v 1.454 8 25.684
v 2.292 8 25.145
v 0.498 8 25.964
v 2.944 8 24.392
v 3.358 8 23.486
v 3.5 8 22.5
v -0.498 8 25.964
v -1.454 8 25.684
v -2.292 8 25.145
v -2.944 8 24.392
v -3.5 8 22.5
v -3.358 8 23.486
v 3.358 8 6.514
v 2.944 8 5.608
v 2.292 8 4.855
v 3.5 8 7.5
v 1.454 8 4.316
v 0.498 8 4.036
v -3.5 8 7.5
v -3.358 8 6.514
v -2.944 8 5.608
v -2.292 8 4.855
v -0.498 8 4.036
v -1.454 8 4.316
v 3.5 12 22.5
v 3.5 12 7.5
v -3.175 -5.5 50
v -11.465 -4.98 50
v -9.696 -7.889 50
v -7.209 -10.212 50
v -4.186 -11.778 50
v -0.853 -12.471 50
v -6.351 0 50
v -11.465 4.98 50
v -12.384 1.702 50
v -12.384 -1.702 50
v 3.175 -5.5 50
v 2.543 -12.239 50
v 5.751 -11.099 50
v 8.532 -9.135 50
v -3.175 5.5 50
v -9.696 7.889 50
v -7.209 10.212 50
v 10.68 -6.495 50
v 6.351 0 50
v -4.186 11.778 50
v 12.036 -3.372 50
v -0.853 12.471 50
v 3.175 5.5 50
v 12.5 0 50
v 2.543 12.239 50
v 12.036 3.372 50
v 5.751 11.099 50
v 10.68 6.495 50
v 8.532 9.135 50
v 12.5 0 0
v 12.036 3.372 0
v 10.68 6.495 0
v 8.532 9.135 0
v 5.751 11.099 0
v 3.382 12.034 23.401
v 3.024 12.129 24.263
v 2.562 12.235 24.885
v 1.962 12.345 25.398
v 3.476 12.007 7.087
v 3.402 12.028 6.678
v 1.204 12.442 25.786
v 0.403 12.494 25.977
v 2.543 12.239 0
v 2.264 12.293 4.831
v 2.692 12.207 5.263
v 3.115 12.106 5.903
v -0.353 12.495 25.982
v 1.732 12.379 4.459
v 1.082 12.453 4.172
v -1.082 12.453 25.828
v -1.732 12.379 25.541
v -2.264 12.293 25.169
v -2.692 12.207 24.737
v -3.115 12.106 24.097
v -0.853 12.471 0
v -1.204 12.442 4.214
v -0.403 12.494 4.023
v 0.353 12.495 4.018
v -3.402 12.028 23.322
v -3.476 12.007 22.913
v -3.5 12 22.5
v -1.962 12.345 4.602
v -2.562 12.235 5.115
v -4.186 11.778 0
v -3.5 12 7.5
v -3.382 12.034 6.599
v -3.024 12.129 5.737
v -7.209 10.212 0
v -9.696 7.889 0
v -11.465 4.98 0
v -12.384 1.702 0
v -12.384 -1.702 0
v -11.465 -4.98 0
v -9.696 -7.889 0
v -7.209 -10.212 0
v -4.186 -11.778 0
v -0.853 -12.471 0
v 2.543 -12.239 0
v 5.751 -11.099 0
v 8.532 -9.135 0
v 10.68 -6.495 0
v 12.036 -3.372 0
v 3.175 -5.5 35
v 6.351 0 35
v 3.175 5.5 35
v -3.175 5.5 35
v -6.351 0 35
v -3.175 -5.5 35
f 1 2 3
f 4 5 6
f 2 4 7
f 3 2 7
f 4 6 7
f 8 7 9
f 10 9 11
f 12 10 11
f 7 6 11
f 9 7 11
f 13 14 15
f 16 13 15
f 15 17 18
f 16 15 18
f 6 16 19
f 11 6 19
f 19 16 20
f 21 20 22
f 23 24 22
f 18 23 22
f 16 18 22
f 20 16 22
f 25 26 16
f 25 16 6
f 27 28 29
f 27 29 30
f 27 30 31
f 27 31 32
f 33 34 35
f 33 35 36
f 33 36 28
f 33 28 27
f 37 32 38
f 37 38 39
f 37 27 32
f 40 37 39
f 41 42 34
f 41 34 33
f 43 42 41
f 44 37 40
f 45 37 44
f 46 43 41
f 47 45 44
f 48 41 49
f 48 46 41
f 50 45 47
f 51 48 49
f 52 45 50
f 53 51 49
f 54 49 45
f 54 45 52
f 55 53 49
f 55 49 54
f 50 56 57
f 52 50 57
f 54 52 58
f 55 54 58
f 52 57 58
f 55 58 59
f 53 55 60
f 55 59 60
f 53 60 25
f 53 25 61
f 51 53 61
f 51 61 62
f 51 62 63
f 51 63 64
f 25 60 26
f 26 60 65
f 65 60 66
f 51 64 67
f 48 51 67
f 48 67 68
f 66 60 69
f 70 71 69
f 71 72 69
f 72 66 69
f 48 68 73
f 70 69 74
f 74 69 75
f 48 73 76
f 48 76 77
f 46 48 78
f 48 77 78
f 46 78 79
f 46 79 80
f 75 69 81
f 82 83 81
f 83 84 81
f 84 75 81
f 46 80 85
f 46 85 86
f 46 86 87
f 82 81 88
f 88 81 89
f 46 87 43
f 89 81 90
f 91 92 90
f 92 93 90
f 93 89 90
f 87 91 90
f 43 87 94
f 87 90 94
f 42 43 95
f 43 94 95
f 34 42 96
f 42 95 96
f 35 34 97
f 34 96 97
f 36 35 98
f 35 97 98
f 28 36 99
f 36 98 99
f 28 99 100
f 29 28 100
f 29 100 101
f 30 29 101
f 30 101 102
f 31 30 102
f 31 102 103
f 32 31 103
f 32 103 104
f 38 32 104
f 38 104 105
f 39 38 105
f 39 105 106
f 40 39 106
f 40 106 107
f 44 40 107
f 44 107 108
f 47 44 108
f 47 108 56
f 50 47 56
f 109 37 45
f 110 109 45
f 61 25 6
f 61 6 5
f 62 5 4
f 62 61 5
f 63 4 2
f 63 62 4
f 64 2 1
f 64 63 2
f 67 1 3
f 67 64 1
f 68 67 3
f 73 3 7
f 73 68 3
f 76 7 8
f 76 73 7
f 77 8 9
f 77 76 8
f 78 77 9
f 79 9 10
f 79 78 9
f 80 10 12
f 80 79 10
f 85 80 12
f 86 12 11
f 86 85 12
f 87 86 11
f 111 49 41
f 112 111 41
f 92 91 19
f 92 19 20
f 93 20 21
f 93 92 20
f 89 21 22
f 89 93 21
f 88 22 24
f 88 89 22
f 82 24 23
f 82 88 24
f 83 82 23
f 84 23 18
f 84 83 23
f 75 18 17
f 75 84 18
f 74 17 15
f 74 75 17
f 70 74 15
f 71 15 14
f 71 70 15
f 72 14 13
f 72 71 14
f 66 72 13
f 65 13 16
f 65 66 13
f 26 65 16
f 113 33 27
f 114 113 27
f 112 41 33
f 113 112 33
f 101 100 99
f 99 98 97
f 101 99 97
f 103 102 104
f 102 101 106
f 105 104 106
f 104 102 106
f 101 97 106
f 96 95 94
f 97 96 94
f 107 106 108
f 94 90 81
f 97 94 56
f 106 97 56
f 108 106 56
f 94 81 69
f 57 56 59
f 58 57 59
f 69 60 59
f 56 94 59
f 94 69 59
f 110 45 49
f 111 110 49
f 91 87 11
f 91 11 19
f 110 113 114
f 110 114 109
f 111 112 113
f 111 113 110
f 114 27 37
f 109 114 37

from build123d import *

# Parameters (mm, degrees)
SCHIZZO1_R                   = 12.5
ESTRUSIONE_ESTRUSIONE1_DEPTH = 50
TAGLIO_ESTRUSIONE1_DEPTH     = 15
TAGLIO_ESTRUSIONE3_START     = 23
TAGLIO_ESTRUSIONE3_DEPTH     = 15


with BuildPart() as part:
    # Schizzo1 → Estrusione-Estrusione1 (new body)
    with BuildSketch(Plane.XY):
        Circle(SCHIZZO1_R)
    extrude(amount=ESTRUSIONE_ESTRUSIONE1_DEPTH)

    # Schizzo2 → Taglio-Estrusione1 (cut)
    with BuildSketch(Plane.XY.offset(50)):
        Polygon((-3.175426481, 5.5), (-6.350852961, 0), (-3.175426481, -5.5), (3.175426481, -5.5), (6.350852961, 0), (3.175426481, 5.5), align=None)
    extrude(amount=-TAGLIO_ESTRUSIONE1_DEPTH, mode=Mode.SUBTRACT)

    # Schizzo3 → Taglio-Estrusione3 (cut)
    with BuildSketch(Plane(origin=(0, 0, 0), x_dir=(1, 0, 0), z_dir=(0, 1, 0)).offset(TAGLIO_ESTRUSIONE3_START)):
        with BuildLine():
            Line((3.5, -7.5), (3.5, -22.5))
            ThreePointArc((3.5, -22.5), (0, -26), (-3.5, -22.5))
            Line((-3.5, -22.5), (-3.5, -7.5))
            ThreePointArc((-3.5, -7.5), (0, -4), (3.5, -7.5))
        make_face()
    extrude(amount=-TAGLIO_ESTRUSIONE3_DEPTH, mode=Mode.SUBTRACT)


solid = part.part
